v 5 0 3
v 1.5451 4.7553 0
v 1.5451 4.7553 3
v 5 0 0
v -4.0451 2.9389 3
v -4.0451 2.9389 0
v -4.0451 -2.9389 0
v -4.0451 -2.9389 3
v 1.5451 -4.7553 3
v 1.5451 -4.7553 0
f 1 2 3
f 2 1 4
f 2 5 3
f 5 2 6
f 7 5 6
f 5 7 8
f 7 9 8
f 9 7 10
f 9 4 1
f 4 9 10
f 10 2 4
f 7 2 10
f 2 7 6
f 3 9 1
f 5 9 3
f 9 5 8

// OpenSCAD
$fn=5;
translate([0,0,0])
{
	rotate(0,[0,0,1])
	{
		cylinder(h=3,d=10);
	}
}
